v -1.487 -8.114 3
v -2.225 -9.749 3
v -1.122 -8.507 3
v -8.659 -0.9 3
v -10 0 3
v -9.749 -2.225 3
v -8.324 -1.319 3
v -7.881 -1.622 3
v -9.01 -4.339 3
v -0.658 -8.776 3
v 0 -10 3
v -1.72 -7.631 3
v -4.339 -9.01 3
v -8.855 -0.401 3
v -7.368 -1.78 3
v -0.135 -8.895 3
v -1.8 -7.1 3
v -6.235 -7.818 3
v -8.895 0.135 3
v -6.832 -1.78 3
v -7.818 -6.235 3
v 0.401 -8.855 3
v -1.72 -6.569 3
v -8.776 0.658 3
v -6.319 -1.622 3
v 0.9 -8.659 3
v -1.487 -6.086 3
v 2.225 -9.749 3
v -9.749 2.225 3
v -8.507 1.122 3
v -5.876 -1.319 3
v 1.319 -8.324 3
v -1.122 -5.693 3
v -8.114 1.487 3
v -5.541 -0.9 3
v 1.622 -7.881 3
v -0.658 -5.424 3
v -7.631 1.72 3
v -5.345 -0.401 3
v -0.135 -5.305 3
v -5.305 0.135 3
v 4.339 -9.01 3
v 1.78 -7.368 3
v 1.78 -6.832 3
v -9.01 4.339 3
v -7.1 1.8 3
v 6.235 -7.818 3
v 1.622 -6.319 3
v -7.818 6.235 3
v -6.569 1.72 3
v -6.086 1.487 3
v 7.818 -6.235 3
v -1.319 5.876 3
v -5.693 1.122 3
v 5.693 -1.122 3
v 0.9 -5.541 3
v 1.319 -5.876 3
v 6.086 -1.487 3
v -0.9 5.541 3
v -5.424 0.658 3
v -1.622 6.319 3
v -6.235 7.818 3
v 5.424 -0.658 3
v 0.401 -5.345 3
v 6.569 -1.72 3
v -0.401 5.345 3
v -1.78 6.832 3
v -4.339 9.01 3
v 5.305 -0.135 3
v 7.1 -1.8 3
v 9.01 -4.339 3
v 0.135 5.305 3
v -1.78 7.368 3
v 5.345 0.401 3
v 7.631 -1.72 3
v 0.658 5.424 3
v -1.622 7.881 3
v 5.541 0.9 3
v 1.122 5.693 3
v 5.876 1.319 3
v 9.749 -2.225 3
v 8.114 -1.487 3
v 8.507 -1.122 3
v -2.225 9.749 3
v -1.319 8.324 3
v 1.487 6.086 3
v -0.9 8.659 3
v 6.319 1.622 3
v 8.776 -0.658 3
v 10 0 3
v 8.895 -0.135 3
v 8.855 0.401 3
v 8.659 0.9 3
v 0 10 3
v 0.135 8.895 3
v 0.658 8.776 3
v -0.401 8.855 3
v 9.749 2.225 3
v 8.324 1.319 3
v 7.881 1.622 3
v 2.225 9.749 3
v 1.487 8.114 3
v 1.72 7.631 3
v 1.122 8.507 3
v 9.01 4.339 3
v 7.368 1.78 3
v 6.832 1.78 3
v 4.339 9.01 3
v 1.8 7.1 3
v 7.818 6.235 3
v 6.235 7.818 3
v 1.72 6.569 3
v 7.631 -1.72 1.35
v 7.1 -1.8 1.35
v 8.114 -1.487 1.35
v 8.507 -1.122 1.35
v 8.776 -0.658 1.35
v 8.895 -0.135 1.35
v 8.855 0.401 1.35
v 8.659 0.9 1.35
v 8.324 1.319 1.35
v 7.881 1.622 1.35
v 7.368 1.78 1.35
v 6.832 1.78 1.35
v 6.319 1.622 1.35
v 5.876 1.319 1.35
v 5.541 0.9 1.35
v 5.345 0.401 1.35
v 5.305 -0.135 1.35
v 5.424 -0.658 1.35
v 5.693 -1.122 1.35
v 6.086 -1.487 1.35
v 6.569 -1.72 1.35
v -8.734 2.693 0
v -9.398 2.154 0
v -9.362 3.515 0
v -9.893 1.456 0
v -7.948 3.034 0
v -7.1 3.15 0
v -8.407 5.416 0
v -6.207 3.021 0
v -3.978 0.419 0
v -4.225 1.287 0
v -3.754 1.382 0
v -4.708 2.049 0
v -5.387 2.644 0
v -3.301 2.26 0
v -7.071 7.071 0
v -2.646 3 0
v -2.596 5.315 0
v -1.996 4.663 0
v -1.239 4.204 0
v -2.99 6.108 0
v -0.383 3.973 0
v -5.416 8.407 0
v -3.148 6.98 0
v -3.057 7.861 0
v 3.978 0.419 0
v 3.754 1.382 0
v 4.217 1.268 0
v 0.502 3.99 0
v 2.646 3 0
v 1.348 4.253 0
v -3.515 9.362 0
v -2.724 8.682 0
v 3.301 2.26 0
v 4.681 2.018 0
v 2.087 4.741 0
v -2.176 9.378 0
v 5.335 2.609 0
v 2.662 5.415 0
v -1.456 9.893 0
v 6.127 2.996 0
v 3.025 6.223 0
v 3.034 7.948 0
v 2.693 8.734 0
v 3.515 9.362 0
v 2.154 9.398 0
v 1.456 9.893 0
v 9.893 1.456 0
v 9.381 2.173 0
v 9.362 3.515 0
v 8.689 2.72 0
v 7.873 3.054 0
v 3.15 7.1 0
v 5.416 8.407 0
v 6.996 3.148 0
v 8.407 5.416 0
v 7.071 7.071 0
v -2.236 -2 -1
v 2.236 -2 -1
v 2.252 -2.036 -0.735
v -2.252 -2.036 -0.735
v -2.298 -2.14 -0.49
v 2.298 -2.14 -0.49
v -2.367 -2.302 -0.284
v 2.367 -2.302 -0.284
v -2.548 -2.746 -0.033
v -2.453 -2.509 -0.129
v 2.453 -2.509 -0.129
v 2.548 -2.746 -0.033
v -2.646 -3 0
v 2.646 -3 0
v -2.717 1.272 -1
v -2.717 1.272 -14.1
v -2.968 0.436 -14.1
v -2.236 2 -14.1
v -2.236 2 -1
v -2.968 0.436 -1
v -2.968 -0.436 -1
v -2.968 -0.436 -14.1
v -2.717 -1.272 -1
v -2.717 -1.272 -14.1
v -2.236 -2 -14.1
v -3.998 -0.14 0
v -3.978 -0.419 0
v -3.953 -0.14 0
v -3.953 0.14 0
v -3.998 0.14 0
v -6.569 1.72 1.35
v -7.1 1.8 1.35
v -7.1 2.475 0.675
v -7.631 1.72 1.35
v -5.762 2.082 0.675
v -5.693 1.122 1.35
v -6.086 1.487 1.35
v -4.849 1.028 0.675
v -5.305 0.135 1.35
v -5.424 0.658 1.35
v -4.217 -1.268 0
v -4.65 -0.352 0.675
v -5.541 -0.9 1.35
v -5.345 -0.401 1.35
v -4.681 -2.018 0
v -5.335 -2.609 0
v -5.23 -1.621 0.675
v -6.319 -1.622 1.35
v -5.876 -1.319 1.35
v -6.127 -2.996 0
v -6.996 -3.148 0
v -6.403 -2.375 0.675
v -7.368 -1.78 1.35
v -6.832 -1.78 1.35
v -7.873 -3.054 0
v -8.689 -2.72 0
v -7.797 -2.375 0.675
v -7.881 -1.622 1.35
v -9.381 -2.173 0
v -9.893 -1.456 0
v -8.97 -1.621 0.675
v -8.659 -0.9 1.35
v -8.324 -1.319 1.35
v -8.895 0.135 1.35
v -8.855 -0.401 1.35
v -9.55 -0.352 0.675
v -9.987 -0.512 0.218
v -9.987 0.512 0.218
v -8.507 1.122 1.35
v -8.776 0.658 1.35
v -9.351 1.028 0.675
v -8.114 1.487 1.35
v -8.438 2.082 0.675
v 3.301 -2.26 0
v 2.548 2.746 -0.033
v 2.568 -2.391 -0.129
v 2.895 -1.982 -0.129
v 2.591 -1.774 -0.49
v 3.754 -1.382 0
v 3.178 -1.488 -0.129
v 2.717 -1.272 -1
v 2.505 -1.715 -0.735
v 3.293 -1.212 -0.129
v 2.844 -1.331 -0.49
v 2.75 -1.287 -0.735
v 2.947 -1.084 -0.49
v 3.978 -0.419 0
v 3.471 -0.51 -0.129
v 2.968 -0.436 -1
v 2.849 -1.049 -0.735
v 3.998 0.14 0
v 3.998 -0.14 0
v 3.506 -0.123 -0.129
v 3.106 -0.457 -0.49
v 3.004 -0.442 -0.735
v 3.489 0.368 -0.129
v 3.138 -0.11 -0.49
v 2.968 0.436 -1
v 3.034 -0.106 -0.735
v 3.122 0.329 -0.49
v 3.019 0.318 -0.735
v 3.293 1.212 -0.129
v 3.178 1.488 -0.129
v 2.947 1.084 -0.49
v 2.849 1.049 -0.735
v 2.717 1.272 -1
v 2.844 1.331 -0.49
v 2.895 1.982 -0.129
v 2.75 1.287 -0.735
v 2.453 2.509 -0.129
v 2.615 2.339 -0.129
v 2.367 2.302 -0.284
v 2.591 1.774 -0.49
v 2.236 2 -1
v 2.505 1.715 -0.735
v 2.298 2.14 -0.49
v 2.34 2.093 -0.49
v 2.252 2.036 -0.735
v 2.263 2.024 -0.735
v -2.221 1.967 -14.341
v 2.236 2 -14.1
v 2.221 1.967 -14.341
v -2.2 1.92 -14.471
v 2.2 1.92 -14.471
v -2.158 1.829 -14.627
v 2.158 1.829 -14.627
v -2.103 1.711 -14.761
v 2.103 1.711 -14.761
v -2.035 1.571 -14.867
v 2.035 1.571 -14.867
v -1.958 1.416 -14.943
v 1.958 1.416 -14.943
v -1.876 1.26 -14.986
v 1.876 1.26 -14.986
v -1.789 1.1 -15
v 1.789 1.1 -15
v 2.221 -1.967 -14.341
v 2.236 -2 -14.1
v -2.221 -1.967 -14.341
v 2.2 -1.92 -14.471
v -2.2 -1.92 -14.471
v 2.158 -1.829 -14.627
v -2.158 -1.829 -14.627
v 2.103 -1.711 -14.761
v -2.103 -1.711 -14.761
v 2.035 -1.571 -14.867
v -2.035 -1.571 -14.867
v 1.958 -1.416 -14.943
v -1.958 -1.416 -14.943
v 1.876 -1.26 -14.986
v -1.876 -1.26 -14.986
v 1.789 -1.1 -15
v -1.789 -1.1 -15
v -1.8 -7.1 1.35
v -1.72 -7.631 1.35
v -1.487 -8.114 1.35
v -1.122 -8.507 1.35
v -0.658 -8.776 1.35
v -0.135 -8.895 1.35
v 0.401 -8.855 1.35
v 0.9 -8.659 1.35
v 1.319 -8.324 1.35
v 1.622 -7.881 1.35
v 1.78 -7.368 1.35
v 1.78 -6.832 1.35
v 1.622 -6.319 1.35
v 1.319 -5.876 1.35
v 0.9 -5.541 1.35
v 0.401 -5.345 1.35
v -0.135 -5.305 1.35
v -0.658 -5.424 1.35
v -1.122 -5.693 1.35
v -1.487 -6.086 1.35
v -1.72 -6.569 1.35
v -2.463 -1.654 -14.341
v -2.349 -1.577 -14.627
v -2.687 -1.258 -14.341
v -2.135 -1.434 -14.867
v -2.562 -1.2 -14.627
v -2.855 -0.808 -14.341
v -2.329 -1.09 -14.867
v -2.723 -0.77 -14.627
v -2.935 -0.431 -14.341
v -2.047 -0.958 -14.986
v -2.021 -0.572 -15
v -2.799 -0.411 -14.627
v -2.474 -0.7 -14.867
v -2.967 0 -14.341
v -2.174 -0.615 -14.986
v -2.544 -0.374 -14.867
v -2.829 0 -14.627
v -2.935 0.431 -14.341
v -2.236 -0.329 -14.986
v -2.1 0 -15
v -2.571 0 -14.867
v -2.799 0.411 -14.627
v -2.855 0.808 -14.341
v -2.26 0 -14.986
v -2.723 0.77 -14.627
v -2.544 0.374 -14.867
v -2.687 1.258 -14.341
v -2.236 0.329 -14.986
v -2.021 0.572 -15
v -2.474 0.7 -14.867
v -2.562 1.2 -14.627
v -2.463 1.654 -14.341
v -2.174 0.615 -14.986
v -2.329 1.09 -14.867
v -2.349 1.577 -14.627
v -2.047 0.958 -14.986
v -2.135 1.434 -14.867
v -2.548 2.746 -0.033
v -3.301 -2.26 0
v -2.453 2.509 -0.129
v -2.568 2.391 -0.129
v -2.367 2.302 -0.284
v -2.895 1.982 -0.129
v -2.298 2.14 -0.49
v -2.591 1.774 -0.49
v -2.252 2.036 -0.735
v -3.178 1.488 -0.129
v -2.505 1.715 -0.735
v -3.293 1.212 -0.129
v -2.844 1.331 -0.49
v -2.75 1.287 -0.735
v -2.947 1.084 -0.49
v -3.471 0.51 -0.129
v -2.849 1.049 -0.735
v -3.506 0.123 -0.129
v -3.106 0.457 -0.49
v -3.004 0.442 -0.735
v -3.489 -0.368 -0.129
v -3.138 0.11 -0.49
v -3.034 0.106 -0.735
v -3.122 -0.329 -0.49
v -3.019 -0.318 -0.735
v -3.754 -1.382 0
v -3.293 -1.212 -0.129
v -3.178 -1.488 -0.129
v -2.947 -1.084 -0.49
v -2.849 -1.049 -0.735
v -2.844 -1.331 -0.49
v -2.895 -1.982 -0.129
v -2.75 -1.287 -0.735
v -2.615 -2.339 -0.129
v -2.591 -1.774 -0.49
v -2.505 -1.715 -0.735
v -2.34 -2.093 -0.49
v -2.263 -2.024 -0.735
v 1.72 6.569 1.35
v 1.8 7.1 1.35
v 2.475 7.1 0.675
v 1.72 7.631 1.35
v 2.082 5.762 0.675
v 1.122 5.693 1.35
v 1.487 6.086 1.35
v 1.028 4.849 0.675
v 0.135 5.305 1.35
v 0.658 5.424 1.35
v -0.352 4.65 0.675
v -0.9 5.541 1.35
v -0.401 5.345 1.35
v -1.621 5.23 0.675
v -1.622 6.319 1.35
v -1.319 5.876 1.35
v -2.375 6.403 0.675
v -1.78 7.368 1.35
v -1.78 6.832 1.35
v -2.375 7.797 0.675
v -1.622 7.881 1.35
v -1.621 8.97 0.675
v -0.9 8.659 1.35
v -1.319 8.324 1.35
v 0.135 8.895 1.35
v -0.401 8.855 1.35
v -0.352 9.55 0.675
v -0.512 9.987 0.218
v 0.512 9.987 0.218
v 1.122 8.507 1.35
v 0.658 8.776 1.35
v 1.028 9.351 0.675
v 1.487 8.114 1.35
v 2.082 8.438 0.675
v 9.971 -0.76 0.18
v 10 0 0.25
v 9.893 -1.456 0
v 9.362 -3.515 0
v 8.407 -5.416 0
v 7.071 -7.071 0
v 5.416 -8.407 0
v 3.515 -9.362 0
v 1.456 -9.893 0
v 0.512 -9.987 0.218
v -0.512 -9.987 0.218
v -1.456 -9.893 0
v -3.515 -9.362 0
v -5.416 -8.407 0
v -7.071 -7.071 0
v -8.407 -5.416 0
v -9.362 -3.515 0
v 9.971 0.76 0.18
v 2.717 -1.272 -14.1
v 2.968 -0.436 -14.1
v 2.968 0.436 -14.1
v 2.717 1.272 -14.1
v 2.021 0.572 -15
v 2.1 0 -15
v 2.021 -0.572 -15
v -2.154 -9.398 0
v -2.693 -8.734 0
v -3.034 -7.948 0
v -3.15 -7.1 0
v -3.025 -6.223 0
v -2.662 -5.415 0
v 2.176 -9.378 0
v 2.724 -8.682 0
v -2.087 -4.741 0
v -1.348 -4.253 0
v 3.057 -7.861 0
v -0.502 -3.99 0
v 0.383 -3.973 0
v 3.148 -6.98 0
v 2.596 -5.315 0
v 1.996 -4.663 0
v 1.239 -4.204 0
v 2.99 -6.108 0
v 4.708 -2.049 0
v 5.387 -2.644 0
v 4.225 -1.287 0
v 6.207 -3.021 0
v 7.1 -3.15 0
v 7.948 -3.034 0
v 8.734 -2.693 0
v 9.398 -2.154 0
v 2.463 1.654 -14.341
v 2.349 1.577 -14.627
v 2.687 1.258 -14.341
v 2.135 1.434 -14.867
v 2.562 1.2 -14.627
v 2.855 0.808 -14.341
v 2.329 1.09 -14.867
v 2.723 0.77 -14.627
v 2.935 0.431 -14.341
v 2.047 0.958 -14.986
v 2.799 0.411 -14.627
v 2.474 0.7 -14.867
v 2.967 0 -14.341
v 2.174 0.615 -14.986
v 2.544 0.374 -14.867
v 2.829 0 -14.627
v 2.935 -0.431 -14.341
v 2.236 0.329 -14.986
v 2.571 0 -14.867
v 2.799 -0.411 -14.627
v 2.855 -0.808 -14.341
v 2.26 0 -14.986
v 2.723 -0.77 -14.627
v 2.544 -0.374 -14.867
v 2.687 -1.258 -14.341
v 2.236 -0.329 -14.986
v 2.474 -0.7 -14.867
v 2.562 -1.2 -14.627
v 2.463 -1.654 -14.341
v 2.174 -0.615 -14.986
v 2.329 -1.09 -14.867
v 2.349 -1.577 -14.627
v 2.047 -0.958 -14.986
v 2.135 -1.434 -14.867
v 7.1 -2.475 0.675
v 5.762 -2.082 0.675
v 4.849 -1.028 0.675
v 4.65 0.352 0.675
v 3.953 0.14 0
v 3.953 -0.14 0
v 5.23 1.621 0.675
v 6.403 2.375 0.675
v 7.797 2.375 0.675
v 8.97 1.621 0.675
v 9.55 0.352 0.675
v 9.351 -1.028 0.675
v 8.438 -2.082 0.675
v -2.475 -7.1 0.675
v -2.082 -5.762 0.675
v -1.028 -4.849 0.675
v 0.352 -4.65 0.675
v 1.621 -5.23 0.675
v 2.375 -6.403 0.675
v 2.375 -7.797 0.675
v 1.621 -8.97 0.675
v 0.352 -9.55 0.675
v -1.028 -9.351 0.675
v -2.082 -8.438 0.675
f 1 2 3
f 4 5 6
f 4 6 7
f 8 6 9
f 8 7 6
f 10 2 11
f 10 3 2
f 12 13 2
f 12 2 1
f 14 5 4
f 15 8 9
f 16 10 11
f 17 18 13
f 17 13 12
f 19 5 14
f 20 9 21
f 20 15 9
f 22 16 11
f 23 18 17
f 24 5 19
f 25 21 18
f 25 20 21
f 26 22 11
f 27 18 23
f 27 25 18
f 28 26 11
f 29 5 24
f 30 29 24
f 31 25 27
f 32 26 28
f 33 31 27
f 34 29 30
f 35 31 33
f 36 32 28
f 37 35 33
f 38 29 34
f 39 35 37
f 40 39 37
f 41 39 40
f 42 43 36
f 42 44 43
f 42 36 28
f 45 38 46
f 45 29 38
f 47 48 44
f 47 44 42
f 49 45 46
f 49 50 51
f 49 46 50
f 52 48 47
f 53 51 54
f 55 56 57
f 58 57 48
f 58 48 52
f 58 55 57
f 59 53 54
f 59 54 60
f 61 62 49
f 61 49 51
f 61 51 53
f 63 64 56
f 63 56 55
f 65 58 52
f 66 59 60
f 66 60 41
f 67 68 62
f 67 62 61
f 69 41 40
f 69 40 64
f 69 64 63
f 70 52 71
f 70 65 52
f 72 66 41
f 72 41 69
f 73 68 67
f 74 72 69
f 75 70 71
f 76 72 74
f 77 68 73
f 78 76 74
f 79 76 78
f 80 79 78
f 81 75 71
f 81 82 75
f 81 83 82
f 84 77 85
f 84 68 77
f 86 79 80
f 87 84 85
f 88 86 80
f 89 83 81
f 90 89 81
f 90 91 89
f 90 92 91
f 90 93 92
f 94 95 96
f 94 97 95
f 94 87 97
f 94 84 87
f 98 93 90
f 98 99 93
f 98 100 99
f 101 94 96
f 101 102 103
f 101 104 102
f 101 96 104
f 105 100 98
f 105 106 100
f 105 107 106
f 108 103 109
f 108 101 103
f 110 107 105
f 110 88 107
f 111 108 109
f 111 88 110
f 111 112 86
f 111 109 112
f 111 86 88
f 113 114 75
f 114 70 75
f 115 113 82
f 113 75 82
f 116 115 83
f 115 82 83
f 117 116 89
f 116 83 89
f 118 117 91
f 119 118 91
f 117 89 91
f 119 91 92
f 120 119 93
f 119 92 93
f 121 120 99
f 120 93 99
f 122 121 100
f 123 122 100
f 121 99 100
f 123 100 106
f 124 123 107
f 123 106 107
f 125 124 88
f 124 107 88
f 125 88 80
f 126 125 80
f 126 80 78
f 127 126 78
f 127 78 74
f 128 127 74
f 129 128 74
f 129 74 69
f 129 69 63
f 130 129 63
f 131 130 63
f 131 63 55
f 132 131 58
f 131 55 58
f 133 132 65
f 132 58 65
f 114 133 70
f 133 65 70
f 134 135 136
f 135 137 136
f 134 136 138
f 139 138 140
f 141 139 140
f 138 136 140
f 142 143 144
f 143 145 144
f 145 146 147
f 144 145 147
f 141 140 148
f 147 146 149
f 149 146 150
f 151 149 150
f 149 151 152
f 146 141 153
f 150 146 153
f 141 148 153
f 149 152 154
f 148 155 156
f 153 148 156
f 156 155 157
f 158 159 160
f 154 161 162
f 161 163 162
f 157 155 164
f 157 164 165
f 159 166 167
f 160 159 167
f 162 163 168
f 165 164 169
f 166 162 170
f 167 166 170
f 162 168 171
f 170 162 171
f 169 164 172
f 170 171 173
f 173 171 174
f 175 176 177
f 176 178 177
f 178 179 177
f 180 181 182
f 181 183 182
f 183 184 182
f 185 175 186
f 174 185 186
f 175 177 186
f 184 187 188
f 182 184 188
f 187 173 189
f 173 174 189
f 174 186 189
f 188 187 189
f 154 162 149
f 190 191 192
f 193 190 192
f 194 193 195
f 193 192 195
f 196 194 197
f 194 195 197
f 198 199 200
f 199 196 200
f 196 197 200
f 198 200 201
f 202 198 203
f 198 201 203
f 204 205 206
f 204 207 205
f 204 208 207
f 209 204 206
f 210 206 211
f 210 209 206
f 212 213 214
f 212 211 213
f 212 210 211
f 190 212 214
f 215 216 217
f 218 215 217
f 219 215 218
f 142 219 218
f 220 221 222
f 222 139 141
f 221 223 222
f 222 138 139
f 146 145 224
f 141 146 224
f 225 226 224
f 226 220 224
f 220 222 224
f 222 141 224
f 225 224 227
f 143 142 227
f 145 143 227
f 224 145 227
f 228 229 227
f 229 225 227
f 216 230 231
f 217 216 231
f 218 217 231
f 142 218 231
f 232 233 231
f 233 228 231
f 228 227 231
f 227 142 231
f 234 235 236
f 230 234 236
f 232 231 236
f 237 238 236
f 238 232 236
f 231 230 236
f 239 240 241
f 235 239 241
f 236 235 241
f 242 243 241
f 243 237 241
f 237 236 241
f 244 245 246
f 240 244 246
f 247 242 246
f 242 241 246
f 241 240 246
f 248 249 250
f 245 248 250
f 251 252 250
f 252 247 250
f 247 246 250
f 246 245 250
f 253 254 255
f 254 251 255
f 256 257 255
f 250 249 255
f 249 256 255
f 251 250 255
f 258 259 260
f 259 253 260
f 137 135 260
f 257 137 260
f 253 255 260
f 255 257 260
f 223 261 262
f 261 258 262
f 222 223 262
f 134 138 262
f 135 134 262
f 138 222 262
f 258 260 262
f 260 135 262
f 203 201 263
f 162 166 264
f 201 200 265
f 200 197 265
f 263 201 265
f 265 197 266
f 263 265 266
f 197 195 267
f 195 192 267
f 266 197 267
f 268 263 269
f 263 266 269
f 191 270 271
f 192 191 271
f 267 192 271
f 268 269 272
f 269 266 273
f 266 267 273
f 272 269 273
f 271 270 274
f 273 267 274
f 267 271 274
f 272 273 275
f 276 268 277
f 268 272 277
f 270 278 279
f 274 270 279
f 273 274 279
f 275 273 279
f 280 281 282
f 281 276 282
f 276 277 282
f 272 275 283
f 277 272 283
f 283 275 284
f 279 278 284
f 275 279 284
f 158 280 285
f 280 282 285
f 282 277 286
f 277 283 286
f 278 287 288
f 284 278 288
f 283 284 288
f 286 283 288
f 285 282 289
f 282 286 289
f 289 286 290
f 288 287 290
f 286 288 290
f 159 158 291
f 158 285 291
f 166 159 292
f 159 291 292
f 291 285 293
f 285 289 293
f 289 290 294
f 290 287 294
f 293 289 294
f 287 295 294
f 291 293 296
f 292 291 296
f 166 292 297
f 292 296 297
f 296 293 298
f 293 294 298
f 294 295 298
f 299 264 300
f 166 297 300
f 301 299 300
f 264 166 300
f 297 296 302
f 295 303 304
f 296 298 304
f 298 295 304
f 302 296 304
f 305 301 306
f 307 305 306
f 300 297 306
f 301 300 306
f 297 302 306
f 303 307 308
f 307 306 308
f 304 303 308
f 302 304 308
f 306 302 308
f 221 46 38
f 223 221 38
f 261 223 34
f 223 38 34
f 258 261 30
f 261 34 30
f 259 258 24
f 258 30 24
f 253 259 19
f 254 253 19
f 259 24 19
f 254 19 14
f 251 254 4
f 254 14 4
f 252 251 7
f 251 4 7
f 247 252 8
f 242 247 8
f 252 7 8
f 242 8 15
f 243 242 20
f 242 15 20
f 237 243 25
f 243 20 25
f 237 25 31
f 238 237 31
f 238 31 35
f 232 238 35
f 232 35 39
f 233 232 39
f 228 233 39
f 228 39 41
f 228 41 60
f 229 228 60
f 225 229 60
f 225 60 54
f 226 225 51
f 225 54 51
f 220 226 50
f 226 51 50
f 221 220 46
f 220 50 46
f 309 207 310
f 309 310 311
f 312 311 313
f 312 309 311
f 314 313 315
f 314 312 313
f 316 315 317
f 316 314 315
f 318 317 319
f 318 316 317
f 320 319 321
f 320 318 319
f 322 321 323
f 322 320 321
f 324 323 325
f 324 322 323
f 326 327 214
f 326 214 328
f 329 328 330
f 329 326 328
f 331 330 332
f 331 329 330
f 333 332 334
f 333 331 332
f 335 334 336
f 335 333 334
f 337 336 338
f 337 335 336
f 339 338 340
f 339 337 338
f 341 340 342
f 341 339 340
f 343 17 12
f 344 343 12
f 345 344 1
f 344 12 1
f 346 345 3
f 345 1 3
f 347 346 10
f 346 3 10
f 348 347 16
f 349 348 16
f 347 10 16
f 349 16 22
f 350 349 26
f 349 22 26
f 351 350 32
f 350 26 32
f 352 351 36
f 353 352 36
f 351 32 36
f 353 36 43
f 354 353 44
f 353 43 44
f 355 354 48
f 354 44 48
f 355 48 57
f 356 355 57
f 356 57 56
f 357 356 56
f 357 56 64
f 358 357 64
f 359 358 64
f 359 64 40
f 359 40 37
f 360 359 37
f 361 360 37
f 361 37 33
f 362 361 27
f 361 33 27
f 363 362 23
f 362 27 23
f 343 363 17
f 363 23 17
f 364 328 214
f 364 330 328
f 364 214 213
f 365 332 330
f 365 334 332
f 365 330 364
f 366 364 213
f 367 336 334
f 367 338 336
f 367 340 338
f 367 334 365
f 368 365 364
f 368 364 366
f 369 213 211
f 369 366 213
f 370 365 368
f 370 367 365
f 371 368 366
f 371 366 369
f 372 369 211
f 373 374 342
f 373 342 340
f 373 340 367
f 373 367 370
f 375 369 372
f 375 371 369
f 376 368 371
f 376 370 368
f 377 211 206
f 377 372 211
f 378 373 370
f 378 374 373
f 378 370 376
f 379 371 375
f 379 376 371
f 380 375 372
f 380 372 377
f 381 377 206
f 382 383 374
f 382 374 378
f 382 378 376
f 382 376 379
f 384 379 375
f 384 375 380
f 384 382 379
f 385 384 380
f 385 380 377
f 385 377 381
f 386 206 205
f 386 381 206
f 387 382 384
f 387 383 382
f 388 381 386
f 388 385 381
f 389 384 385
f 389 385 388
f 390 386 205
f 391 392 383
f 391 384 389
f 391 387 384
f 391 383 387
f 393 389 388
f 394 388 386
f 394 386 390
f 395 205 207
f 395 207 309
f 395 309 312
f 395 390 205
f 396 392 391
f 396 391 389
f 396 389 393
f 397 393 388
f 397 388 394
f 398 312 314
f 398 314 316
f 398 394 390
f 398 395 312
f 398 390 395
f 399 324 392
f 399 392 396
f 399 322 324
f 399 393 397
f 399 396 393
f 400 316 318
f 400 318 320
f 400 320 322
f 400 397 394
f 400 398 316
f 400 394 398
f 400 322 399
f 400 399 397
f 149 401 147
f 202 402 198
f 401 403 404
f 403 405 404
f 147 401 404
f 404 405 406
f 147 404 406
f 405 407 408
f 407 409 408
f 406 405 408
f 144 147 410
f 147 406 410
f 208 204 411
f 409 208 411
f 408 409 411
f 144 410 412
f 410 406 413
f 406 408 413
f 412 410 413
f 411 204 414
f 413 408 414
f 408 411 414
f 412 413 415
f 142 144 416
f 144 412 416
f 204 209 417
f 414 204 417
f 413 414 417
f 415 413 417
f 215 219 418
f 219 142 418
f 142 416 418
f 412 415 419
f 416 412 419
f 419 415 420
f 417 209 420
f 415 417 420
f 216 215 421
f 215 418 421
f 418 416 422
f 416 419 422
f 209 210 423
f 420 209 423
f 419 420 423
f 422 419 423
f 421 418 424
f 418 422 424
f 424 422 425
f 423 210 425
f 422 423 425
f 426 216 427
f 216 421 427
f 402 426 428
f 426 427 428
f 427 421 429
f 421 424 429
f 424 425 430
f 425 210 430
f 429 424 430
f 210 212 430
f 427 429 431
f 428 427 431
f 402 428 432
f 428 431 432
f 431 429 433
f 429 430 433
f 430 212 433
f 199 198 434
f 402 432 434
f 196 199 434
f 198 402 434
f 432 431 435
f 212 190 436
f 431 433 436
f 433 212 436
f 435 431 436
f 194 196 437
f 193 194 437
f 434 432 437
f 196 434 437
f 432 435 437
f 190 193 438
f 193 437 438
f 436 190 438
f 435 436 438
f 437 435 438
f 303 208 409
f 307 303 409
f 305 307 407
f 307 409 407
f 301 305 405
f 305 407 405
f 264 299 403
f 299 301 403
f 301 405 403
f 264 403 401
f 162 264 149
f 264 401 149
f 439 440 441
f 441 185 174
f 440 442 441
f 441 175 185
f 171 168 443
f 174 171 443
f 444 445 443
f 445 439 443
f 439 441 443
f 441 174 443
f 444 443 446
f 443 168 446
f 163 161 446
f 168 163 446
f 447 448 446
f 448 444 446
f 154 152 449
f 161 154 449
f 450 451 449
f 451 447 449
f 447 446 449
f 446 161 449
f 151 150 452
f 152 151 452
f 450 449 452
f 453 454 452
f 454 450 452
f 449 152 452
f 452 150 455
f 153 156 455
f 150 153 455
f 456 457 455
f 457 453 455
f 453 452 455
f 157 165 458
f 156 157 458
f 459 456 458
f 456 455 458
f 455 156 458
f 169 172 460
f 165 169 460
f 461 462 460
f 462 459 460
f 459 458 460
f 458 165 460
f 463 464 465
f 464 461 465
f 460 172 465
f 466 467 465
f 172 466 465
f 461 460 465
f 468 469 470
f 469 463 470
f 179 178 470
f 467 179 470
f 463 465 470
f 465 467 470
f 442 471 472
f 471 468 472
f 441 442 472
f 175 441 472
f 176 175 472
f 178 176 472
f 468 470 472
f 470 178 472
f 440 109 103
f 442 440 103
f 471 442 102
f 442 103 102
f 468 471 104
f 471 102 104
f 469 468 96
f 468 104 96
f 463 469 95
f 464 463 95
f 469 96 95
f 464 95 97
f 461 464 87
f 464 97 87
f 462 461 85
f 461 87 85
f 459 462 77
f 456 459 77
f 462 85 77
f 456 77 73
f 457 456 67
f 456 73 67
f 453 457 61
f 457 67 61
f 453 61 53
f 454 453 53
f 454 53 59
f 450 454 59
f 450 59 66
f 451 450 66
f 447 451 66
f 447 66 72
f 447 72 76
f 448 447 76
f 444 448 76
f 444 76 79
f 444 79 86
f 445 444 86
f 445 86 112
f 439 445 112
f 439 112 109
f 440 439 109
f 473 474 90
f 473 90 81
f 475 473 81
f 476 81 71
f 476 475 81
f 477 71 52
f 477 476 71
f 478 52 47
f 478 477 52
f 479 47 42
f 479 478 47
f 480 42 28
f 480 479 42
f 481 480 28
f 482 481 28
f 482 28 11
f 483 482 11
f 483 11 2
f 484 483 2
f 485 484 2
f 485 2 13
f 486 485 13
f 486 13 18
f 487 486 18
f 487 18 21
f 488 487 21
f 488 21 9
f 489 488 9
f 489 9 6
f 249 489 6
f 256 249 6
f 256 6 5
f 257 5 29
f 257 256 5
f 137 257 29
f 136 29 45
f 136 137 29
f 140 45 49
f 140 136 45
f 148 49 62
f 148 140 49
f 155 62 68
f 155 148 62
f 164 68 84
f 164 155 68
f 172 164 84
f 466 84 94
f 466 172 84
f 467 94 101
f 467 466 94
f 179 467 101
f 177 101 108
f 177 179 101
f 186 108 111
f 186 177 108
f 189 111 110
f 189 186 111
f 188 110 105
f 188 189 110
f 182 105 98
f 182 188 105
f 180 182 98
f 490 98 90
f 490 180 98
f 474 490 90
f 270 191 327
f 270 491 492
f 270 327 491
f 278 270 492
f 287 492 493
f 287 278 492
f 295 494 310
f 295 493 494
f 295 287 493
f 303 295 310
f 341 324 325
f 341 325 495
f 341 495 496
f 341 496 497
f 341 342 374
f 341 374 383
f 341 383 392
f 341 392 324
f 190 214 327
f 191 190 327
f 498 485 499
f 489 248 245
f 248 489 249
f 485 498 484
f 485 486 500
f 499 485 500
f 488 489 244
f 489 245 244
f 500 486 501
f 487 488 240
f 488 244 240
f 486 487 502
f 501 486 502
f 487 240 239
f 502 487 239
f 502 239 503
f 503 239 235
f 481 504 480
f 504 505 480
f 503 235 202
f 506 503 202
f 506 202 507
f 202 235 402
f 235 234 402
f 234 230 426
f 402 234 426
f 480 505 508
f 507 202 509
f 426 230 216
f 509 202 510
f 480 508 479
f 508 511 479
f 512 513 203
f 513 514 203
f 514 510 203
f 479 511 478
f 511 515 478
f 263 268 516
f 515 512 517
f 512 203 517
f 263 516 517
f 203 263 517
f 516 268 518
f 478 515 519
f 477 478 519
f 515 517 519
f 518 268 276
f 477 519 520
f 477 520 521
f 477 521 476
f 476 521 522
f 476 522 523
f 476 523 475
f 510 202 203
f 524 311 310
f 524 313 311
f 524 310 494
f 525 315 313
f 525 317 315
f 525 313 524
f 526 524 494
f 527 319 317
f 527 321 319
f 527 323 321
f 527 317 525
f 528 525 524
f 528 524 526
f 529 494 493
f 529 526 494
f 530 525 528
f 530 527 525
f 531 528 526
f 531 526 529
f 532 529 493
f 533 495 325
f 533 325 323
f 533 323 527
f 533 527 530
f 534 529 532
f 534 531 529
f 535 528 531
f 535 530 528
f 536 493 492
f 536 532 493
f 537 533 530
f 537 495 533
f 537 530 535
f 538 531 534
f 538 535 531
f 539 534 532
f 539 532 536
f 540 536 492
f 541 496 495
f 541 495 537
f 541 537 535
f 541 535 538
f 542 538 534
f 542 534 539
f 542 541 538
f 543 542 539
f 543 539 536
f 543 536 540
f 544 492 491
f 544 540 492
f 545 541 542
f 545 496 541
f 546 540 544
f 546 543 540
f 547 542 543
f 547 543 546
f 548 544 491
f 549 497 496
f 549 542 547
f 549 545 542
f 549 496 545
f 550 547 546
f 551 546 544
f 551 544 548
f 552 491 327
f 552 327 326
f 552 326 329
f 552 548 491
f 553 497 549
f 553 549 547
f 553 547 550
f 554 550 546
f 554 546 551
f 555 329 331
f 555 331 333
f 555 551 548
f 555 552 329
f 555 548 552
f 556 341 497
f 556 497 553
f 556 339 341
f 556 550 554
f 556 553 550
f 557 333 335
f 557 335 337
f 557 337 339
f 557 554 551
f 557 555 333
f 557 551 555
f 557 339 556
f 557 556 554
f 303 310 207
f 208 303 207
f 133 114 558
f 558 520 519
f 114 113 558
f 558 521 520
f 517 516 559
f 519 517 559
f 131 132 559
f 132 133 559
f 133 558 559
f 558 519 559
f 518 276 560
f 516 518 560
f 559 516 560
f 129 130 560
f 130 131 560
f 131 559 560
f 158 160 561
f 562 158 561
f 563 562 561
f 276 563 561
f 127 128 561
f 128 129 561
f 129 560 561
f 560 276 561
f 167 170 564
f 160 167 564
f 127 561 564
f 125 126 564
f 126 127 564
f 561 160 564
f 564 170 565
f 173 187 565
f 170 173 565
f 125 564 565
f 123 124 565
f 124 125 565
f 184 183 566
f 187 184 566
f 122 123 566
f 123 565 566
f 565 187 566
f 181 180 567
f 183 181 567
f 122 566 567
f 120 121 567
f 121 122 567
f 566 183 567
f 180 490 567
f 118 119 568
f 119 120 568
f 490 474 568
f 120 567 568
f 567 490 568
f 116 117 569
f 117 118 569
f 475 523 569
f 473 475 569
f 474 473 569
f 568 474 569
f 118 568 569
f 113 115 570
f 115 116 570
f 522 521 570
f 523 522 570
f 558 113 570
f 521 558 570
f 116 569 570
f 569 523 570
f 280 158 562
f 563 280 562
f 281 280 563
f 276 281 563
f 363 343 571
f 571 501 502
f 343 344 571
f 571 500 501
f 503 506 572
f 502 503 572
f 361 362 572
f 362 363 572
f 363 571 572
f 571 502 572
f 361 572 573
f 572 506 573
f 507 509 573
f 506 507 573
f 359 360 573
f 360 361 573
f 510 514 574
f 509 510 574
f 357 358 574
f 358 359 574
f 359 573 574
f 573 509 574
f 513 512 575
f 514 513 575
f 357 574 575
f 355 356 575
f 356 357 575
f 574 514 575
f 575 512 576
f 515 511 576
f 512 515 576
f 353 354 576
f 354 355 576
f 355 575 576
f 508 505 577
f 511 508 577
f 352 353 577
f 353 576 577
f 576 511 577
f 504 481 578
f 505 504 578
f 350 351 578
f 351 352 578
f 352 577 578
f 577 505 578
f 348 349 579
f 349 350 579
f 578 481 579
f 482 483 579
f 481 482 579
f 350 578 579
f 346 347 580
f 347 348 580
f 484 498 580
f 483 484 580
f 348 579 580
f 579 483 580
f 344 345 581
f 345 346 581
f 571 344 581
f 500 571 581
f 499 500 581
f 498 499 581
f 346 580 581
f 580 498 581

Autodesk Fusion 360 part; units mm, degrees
sketch "Sketch1" plane through (0, 0, 0) normal (0, 0, 1) x (1, 0, 0)
  circle A0 centre (0, 0) radius 10
  dimension "d1" = 20
extrude "Extrude1" add sketch "Sketch1" along normal blind 3
sketch "Sketch2" plane through (0, 0, 0) normal (0, 0, -1) x (1, 0, 0)
  circle A0 centre (0, 0) radius 10
  line L0 (-2.2361, 2) -> (2.2361, 2)
  line L1 (2.2361, -2) -> (-2.2361, -2)
  arc A1 (-2.2361, 2) -> (-2.2361, -2) centre (0, 0) ccw
  arc A2 (2.2361, -2) -> (2.2361, 2) centre (0, 0) ccw
  dimension "d4" = 6
  dimension "d5" = 4
extrude "Extrude2" add sketch "Sketch2" along normal blind 15 contours L0 L1 A1 A2
fillet "Fillet1" radius 1 4 edges at (0, -2, 0) (3, 0, 0) (-3, 0, 0) (0, 2, 0)
fillet "Fillet1" radius 0.9 4 edges at (0, -2, -15) (3, 0, -15) (0, 2, -15) (-3, 0, -15)
sketch "Sketch3" plane through (0, 0, 0) normal (0, 0, -1) x (1, 0, 0)
  circle A0 centre (0, 0) radius 10
  line L0 (-2.6458, 3) -> (2.6458, 3)
  arc A1 (2.6458, -3) -> (2.6458, 3) centre (0, 0) ccw
  line L1 (2.6458, -3) -> (-2.6458, -3)
  arc A2 (-2.6458, 3) -> (-2.6458, -3) centre (0, 0) ccw
  point P0 (-7.1, 0)
  dimension "d10" = 7.1
hole "Hole1" at (-7.1, 0, 0) direction (0, 0, 1) diameter 3.6 depth 12 tip angle 118 countersink diameter 6.3 countersink angle 90
pattern_circular "C-Pattern1" count 4 over 360 about axis through (0, 0, 1.75) along (0, 0, 1) of "Hole1"
